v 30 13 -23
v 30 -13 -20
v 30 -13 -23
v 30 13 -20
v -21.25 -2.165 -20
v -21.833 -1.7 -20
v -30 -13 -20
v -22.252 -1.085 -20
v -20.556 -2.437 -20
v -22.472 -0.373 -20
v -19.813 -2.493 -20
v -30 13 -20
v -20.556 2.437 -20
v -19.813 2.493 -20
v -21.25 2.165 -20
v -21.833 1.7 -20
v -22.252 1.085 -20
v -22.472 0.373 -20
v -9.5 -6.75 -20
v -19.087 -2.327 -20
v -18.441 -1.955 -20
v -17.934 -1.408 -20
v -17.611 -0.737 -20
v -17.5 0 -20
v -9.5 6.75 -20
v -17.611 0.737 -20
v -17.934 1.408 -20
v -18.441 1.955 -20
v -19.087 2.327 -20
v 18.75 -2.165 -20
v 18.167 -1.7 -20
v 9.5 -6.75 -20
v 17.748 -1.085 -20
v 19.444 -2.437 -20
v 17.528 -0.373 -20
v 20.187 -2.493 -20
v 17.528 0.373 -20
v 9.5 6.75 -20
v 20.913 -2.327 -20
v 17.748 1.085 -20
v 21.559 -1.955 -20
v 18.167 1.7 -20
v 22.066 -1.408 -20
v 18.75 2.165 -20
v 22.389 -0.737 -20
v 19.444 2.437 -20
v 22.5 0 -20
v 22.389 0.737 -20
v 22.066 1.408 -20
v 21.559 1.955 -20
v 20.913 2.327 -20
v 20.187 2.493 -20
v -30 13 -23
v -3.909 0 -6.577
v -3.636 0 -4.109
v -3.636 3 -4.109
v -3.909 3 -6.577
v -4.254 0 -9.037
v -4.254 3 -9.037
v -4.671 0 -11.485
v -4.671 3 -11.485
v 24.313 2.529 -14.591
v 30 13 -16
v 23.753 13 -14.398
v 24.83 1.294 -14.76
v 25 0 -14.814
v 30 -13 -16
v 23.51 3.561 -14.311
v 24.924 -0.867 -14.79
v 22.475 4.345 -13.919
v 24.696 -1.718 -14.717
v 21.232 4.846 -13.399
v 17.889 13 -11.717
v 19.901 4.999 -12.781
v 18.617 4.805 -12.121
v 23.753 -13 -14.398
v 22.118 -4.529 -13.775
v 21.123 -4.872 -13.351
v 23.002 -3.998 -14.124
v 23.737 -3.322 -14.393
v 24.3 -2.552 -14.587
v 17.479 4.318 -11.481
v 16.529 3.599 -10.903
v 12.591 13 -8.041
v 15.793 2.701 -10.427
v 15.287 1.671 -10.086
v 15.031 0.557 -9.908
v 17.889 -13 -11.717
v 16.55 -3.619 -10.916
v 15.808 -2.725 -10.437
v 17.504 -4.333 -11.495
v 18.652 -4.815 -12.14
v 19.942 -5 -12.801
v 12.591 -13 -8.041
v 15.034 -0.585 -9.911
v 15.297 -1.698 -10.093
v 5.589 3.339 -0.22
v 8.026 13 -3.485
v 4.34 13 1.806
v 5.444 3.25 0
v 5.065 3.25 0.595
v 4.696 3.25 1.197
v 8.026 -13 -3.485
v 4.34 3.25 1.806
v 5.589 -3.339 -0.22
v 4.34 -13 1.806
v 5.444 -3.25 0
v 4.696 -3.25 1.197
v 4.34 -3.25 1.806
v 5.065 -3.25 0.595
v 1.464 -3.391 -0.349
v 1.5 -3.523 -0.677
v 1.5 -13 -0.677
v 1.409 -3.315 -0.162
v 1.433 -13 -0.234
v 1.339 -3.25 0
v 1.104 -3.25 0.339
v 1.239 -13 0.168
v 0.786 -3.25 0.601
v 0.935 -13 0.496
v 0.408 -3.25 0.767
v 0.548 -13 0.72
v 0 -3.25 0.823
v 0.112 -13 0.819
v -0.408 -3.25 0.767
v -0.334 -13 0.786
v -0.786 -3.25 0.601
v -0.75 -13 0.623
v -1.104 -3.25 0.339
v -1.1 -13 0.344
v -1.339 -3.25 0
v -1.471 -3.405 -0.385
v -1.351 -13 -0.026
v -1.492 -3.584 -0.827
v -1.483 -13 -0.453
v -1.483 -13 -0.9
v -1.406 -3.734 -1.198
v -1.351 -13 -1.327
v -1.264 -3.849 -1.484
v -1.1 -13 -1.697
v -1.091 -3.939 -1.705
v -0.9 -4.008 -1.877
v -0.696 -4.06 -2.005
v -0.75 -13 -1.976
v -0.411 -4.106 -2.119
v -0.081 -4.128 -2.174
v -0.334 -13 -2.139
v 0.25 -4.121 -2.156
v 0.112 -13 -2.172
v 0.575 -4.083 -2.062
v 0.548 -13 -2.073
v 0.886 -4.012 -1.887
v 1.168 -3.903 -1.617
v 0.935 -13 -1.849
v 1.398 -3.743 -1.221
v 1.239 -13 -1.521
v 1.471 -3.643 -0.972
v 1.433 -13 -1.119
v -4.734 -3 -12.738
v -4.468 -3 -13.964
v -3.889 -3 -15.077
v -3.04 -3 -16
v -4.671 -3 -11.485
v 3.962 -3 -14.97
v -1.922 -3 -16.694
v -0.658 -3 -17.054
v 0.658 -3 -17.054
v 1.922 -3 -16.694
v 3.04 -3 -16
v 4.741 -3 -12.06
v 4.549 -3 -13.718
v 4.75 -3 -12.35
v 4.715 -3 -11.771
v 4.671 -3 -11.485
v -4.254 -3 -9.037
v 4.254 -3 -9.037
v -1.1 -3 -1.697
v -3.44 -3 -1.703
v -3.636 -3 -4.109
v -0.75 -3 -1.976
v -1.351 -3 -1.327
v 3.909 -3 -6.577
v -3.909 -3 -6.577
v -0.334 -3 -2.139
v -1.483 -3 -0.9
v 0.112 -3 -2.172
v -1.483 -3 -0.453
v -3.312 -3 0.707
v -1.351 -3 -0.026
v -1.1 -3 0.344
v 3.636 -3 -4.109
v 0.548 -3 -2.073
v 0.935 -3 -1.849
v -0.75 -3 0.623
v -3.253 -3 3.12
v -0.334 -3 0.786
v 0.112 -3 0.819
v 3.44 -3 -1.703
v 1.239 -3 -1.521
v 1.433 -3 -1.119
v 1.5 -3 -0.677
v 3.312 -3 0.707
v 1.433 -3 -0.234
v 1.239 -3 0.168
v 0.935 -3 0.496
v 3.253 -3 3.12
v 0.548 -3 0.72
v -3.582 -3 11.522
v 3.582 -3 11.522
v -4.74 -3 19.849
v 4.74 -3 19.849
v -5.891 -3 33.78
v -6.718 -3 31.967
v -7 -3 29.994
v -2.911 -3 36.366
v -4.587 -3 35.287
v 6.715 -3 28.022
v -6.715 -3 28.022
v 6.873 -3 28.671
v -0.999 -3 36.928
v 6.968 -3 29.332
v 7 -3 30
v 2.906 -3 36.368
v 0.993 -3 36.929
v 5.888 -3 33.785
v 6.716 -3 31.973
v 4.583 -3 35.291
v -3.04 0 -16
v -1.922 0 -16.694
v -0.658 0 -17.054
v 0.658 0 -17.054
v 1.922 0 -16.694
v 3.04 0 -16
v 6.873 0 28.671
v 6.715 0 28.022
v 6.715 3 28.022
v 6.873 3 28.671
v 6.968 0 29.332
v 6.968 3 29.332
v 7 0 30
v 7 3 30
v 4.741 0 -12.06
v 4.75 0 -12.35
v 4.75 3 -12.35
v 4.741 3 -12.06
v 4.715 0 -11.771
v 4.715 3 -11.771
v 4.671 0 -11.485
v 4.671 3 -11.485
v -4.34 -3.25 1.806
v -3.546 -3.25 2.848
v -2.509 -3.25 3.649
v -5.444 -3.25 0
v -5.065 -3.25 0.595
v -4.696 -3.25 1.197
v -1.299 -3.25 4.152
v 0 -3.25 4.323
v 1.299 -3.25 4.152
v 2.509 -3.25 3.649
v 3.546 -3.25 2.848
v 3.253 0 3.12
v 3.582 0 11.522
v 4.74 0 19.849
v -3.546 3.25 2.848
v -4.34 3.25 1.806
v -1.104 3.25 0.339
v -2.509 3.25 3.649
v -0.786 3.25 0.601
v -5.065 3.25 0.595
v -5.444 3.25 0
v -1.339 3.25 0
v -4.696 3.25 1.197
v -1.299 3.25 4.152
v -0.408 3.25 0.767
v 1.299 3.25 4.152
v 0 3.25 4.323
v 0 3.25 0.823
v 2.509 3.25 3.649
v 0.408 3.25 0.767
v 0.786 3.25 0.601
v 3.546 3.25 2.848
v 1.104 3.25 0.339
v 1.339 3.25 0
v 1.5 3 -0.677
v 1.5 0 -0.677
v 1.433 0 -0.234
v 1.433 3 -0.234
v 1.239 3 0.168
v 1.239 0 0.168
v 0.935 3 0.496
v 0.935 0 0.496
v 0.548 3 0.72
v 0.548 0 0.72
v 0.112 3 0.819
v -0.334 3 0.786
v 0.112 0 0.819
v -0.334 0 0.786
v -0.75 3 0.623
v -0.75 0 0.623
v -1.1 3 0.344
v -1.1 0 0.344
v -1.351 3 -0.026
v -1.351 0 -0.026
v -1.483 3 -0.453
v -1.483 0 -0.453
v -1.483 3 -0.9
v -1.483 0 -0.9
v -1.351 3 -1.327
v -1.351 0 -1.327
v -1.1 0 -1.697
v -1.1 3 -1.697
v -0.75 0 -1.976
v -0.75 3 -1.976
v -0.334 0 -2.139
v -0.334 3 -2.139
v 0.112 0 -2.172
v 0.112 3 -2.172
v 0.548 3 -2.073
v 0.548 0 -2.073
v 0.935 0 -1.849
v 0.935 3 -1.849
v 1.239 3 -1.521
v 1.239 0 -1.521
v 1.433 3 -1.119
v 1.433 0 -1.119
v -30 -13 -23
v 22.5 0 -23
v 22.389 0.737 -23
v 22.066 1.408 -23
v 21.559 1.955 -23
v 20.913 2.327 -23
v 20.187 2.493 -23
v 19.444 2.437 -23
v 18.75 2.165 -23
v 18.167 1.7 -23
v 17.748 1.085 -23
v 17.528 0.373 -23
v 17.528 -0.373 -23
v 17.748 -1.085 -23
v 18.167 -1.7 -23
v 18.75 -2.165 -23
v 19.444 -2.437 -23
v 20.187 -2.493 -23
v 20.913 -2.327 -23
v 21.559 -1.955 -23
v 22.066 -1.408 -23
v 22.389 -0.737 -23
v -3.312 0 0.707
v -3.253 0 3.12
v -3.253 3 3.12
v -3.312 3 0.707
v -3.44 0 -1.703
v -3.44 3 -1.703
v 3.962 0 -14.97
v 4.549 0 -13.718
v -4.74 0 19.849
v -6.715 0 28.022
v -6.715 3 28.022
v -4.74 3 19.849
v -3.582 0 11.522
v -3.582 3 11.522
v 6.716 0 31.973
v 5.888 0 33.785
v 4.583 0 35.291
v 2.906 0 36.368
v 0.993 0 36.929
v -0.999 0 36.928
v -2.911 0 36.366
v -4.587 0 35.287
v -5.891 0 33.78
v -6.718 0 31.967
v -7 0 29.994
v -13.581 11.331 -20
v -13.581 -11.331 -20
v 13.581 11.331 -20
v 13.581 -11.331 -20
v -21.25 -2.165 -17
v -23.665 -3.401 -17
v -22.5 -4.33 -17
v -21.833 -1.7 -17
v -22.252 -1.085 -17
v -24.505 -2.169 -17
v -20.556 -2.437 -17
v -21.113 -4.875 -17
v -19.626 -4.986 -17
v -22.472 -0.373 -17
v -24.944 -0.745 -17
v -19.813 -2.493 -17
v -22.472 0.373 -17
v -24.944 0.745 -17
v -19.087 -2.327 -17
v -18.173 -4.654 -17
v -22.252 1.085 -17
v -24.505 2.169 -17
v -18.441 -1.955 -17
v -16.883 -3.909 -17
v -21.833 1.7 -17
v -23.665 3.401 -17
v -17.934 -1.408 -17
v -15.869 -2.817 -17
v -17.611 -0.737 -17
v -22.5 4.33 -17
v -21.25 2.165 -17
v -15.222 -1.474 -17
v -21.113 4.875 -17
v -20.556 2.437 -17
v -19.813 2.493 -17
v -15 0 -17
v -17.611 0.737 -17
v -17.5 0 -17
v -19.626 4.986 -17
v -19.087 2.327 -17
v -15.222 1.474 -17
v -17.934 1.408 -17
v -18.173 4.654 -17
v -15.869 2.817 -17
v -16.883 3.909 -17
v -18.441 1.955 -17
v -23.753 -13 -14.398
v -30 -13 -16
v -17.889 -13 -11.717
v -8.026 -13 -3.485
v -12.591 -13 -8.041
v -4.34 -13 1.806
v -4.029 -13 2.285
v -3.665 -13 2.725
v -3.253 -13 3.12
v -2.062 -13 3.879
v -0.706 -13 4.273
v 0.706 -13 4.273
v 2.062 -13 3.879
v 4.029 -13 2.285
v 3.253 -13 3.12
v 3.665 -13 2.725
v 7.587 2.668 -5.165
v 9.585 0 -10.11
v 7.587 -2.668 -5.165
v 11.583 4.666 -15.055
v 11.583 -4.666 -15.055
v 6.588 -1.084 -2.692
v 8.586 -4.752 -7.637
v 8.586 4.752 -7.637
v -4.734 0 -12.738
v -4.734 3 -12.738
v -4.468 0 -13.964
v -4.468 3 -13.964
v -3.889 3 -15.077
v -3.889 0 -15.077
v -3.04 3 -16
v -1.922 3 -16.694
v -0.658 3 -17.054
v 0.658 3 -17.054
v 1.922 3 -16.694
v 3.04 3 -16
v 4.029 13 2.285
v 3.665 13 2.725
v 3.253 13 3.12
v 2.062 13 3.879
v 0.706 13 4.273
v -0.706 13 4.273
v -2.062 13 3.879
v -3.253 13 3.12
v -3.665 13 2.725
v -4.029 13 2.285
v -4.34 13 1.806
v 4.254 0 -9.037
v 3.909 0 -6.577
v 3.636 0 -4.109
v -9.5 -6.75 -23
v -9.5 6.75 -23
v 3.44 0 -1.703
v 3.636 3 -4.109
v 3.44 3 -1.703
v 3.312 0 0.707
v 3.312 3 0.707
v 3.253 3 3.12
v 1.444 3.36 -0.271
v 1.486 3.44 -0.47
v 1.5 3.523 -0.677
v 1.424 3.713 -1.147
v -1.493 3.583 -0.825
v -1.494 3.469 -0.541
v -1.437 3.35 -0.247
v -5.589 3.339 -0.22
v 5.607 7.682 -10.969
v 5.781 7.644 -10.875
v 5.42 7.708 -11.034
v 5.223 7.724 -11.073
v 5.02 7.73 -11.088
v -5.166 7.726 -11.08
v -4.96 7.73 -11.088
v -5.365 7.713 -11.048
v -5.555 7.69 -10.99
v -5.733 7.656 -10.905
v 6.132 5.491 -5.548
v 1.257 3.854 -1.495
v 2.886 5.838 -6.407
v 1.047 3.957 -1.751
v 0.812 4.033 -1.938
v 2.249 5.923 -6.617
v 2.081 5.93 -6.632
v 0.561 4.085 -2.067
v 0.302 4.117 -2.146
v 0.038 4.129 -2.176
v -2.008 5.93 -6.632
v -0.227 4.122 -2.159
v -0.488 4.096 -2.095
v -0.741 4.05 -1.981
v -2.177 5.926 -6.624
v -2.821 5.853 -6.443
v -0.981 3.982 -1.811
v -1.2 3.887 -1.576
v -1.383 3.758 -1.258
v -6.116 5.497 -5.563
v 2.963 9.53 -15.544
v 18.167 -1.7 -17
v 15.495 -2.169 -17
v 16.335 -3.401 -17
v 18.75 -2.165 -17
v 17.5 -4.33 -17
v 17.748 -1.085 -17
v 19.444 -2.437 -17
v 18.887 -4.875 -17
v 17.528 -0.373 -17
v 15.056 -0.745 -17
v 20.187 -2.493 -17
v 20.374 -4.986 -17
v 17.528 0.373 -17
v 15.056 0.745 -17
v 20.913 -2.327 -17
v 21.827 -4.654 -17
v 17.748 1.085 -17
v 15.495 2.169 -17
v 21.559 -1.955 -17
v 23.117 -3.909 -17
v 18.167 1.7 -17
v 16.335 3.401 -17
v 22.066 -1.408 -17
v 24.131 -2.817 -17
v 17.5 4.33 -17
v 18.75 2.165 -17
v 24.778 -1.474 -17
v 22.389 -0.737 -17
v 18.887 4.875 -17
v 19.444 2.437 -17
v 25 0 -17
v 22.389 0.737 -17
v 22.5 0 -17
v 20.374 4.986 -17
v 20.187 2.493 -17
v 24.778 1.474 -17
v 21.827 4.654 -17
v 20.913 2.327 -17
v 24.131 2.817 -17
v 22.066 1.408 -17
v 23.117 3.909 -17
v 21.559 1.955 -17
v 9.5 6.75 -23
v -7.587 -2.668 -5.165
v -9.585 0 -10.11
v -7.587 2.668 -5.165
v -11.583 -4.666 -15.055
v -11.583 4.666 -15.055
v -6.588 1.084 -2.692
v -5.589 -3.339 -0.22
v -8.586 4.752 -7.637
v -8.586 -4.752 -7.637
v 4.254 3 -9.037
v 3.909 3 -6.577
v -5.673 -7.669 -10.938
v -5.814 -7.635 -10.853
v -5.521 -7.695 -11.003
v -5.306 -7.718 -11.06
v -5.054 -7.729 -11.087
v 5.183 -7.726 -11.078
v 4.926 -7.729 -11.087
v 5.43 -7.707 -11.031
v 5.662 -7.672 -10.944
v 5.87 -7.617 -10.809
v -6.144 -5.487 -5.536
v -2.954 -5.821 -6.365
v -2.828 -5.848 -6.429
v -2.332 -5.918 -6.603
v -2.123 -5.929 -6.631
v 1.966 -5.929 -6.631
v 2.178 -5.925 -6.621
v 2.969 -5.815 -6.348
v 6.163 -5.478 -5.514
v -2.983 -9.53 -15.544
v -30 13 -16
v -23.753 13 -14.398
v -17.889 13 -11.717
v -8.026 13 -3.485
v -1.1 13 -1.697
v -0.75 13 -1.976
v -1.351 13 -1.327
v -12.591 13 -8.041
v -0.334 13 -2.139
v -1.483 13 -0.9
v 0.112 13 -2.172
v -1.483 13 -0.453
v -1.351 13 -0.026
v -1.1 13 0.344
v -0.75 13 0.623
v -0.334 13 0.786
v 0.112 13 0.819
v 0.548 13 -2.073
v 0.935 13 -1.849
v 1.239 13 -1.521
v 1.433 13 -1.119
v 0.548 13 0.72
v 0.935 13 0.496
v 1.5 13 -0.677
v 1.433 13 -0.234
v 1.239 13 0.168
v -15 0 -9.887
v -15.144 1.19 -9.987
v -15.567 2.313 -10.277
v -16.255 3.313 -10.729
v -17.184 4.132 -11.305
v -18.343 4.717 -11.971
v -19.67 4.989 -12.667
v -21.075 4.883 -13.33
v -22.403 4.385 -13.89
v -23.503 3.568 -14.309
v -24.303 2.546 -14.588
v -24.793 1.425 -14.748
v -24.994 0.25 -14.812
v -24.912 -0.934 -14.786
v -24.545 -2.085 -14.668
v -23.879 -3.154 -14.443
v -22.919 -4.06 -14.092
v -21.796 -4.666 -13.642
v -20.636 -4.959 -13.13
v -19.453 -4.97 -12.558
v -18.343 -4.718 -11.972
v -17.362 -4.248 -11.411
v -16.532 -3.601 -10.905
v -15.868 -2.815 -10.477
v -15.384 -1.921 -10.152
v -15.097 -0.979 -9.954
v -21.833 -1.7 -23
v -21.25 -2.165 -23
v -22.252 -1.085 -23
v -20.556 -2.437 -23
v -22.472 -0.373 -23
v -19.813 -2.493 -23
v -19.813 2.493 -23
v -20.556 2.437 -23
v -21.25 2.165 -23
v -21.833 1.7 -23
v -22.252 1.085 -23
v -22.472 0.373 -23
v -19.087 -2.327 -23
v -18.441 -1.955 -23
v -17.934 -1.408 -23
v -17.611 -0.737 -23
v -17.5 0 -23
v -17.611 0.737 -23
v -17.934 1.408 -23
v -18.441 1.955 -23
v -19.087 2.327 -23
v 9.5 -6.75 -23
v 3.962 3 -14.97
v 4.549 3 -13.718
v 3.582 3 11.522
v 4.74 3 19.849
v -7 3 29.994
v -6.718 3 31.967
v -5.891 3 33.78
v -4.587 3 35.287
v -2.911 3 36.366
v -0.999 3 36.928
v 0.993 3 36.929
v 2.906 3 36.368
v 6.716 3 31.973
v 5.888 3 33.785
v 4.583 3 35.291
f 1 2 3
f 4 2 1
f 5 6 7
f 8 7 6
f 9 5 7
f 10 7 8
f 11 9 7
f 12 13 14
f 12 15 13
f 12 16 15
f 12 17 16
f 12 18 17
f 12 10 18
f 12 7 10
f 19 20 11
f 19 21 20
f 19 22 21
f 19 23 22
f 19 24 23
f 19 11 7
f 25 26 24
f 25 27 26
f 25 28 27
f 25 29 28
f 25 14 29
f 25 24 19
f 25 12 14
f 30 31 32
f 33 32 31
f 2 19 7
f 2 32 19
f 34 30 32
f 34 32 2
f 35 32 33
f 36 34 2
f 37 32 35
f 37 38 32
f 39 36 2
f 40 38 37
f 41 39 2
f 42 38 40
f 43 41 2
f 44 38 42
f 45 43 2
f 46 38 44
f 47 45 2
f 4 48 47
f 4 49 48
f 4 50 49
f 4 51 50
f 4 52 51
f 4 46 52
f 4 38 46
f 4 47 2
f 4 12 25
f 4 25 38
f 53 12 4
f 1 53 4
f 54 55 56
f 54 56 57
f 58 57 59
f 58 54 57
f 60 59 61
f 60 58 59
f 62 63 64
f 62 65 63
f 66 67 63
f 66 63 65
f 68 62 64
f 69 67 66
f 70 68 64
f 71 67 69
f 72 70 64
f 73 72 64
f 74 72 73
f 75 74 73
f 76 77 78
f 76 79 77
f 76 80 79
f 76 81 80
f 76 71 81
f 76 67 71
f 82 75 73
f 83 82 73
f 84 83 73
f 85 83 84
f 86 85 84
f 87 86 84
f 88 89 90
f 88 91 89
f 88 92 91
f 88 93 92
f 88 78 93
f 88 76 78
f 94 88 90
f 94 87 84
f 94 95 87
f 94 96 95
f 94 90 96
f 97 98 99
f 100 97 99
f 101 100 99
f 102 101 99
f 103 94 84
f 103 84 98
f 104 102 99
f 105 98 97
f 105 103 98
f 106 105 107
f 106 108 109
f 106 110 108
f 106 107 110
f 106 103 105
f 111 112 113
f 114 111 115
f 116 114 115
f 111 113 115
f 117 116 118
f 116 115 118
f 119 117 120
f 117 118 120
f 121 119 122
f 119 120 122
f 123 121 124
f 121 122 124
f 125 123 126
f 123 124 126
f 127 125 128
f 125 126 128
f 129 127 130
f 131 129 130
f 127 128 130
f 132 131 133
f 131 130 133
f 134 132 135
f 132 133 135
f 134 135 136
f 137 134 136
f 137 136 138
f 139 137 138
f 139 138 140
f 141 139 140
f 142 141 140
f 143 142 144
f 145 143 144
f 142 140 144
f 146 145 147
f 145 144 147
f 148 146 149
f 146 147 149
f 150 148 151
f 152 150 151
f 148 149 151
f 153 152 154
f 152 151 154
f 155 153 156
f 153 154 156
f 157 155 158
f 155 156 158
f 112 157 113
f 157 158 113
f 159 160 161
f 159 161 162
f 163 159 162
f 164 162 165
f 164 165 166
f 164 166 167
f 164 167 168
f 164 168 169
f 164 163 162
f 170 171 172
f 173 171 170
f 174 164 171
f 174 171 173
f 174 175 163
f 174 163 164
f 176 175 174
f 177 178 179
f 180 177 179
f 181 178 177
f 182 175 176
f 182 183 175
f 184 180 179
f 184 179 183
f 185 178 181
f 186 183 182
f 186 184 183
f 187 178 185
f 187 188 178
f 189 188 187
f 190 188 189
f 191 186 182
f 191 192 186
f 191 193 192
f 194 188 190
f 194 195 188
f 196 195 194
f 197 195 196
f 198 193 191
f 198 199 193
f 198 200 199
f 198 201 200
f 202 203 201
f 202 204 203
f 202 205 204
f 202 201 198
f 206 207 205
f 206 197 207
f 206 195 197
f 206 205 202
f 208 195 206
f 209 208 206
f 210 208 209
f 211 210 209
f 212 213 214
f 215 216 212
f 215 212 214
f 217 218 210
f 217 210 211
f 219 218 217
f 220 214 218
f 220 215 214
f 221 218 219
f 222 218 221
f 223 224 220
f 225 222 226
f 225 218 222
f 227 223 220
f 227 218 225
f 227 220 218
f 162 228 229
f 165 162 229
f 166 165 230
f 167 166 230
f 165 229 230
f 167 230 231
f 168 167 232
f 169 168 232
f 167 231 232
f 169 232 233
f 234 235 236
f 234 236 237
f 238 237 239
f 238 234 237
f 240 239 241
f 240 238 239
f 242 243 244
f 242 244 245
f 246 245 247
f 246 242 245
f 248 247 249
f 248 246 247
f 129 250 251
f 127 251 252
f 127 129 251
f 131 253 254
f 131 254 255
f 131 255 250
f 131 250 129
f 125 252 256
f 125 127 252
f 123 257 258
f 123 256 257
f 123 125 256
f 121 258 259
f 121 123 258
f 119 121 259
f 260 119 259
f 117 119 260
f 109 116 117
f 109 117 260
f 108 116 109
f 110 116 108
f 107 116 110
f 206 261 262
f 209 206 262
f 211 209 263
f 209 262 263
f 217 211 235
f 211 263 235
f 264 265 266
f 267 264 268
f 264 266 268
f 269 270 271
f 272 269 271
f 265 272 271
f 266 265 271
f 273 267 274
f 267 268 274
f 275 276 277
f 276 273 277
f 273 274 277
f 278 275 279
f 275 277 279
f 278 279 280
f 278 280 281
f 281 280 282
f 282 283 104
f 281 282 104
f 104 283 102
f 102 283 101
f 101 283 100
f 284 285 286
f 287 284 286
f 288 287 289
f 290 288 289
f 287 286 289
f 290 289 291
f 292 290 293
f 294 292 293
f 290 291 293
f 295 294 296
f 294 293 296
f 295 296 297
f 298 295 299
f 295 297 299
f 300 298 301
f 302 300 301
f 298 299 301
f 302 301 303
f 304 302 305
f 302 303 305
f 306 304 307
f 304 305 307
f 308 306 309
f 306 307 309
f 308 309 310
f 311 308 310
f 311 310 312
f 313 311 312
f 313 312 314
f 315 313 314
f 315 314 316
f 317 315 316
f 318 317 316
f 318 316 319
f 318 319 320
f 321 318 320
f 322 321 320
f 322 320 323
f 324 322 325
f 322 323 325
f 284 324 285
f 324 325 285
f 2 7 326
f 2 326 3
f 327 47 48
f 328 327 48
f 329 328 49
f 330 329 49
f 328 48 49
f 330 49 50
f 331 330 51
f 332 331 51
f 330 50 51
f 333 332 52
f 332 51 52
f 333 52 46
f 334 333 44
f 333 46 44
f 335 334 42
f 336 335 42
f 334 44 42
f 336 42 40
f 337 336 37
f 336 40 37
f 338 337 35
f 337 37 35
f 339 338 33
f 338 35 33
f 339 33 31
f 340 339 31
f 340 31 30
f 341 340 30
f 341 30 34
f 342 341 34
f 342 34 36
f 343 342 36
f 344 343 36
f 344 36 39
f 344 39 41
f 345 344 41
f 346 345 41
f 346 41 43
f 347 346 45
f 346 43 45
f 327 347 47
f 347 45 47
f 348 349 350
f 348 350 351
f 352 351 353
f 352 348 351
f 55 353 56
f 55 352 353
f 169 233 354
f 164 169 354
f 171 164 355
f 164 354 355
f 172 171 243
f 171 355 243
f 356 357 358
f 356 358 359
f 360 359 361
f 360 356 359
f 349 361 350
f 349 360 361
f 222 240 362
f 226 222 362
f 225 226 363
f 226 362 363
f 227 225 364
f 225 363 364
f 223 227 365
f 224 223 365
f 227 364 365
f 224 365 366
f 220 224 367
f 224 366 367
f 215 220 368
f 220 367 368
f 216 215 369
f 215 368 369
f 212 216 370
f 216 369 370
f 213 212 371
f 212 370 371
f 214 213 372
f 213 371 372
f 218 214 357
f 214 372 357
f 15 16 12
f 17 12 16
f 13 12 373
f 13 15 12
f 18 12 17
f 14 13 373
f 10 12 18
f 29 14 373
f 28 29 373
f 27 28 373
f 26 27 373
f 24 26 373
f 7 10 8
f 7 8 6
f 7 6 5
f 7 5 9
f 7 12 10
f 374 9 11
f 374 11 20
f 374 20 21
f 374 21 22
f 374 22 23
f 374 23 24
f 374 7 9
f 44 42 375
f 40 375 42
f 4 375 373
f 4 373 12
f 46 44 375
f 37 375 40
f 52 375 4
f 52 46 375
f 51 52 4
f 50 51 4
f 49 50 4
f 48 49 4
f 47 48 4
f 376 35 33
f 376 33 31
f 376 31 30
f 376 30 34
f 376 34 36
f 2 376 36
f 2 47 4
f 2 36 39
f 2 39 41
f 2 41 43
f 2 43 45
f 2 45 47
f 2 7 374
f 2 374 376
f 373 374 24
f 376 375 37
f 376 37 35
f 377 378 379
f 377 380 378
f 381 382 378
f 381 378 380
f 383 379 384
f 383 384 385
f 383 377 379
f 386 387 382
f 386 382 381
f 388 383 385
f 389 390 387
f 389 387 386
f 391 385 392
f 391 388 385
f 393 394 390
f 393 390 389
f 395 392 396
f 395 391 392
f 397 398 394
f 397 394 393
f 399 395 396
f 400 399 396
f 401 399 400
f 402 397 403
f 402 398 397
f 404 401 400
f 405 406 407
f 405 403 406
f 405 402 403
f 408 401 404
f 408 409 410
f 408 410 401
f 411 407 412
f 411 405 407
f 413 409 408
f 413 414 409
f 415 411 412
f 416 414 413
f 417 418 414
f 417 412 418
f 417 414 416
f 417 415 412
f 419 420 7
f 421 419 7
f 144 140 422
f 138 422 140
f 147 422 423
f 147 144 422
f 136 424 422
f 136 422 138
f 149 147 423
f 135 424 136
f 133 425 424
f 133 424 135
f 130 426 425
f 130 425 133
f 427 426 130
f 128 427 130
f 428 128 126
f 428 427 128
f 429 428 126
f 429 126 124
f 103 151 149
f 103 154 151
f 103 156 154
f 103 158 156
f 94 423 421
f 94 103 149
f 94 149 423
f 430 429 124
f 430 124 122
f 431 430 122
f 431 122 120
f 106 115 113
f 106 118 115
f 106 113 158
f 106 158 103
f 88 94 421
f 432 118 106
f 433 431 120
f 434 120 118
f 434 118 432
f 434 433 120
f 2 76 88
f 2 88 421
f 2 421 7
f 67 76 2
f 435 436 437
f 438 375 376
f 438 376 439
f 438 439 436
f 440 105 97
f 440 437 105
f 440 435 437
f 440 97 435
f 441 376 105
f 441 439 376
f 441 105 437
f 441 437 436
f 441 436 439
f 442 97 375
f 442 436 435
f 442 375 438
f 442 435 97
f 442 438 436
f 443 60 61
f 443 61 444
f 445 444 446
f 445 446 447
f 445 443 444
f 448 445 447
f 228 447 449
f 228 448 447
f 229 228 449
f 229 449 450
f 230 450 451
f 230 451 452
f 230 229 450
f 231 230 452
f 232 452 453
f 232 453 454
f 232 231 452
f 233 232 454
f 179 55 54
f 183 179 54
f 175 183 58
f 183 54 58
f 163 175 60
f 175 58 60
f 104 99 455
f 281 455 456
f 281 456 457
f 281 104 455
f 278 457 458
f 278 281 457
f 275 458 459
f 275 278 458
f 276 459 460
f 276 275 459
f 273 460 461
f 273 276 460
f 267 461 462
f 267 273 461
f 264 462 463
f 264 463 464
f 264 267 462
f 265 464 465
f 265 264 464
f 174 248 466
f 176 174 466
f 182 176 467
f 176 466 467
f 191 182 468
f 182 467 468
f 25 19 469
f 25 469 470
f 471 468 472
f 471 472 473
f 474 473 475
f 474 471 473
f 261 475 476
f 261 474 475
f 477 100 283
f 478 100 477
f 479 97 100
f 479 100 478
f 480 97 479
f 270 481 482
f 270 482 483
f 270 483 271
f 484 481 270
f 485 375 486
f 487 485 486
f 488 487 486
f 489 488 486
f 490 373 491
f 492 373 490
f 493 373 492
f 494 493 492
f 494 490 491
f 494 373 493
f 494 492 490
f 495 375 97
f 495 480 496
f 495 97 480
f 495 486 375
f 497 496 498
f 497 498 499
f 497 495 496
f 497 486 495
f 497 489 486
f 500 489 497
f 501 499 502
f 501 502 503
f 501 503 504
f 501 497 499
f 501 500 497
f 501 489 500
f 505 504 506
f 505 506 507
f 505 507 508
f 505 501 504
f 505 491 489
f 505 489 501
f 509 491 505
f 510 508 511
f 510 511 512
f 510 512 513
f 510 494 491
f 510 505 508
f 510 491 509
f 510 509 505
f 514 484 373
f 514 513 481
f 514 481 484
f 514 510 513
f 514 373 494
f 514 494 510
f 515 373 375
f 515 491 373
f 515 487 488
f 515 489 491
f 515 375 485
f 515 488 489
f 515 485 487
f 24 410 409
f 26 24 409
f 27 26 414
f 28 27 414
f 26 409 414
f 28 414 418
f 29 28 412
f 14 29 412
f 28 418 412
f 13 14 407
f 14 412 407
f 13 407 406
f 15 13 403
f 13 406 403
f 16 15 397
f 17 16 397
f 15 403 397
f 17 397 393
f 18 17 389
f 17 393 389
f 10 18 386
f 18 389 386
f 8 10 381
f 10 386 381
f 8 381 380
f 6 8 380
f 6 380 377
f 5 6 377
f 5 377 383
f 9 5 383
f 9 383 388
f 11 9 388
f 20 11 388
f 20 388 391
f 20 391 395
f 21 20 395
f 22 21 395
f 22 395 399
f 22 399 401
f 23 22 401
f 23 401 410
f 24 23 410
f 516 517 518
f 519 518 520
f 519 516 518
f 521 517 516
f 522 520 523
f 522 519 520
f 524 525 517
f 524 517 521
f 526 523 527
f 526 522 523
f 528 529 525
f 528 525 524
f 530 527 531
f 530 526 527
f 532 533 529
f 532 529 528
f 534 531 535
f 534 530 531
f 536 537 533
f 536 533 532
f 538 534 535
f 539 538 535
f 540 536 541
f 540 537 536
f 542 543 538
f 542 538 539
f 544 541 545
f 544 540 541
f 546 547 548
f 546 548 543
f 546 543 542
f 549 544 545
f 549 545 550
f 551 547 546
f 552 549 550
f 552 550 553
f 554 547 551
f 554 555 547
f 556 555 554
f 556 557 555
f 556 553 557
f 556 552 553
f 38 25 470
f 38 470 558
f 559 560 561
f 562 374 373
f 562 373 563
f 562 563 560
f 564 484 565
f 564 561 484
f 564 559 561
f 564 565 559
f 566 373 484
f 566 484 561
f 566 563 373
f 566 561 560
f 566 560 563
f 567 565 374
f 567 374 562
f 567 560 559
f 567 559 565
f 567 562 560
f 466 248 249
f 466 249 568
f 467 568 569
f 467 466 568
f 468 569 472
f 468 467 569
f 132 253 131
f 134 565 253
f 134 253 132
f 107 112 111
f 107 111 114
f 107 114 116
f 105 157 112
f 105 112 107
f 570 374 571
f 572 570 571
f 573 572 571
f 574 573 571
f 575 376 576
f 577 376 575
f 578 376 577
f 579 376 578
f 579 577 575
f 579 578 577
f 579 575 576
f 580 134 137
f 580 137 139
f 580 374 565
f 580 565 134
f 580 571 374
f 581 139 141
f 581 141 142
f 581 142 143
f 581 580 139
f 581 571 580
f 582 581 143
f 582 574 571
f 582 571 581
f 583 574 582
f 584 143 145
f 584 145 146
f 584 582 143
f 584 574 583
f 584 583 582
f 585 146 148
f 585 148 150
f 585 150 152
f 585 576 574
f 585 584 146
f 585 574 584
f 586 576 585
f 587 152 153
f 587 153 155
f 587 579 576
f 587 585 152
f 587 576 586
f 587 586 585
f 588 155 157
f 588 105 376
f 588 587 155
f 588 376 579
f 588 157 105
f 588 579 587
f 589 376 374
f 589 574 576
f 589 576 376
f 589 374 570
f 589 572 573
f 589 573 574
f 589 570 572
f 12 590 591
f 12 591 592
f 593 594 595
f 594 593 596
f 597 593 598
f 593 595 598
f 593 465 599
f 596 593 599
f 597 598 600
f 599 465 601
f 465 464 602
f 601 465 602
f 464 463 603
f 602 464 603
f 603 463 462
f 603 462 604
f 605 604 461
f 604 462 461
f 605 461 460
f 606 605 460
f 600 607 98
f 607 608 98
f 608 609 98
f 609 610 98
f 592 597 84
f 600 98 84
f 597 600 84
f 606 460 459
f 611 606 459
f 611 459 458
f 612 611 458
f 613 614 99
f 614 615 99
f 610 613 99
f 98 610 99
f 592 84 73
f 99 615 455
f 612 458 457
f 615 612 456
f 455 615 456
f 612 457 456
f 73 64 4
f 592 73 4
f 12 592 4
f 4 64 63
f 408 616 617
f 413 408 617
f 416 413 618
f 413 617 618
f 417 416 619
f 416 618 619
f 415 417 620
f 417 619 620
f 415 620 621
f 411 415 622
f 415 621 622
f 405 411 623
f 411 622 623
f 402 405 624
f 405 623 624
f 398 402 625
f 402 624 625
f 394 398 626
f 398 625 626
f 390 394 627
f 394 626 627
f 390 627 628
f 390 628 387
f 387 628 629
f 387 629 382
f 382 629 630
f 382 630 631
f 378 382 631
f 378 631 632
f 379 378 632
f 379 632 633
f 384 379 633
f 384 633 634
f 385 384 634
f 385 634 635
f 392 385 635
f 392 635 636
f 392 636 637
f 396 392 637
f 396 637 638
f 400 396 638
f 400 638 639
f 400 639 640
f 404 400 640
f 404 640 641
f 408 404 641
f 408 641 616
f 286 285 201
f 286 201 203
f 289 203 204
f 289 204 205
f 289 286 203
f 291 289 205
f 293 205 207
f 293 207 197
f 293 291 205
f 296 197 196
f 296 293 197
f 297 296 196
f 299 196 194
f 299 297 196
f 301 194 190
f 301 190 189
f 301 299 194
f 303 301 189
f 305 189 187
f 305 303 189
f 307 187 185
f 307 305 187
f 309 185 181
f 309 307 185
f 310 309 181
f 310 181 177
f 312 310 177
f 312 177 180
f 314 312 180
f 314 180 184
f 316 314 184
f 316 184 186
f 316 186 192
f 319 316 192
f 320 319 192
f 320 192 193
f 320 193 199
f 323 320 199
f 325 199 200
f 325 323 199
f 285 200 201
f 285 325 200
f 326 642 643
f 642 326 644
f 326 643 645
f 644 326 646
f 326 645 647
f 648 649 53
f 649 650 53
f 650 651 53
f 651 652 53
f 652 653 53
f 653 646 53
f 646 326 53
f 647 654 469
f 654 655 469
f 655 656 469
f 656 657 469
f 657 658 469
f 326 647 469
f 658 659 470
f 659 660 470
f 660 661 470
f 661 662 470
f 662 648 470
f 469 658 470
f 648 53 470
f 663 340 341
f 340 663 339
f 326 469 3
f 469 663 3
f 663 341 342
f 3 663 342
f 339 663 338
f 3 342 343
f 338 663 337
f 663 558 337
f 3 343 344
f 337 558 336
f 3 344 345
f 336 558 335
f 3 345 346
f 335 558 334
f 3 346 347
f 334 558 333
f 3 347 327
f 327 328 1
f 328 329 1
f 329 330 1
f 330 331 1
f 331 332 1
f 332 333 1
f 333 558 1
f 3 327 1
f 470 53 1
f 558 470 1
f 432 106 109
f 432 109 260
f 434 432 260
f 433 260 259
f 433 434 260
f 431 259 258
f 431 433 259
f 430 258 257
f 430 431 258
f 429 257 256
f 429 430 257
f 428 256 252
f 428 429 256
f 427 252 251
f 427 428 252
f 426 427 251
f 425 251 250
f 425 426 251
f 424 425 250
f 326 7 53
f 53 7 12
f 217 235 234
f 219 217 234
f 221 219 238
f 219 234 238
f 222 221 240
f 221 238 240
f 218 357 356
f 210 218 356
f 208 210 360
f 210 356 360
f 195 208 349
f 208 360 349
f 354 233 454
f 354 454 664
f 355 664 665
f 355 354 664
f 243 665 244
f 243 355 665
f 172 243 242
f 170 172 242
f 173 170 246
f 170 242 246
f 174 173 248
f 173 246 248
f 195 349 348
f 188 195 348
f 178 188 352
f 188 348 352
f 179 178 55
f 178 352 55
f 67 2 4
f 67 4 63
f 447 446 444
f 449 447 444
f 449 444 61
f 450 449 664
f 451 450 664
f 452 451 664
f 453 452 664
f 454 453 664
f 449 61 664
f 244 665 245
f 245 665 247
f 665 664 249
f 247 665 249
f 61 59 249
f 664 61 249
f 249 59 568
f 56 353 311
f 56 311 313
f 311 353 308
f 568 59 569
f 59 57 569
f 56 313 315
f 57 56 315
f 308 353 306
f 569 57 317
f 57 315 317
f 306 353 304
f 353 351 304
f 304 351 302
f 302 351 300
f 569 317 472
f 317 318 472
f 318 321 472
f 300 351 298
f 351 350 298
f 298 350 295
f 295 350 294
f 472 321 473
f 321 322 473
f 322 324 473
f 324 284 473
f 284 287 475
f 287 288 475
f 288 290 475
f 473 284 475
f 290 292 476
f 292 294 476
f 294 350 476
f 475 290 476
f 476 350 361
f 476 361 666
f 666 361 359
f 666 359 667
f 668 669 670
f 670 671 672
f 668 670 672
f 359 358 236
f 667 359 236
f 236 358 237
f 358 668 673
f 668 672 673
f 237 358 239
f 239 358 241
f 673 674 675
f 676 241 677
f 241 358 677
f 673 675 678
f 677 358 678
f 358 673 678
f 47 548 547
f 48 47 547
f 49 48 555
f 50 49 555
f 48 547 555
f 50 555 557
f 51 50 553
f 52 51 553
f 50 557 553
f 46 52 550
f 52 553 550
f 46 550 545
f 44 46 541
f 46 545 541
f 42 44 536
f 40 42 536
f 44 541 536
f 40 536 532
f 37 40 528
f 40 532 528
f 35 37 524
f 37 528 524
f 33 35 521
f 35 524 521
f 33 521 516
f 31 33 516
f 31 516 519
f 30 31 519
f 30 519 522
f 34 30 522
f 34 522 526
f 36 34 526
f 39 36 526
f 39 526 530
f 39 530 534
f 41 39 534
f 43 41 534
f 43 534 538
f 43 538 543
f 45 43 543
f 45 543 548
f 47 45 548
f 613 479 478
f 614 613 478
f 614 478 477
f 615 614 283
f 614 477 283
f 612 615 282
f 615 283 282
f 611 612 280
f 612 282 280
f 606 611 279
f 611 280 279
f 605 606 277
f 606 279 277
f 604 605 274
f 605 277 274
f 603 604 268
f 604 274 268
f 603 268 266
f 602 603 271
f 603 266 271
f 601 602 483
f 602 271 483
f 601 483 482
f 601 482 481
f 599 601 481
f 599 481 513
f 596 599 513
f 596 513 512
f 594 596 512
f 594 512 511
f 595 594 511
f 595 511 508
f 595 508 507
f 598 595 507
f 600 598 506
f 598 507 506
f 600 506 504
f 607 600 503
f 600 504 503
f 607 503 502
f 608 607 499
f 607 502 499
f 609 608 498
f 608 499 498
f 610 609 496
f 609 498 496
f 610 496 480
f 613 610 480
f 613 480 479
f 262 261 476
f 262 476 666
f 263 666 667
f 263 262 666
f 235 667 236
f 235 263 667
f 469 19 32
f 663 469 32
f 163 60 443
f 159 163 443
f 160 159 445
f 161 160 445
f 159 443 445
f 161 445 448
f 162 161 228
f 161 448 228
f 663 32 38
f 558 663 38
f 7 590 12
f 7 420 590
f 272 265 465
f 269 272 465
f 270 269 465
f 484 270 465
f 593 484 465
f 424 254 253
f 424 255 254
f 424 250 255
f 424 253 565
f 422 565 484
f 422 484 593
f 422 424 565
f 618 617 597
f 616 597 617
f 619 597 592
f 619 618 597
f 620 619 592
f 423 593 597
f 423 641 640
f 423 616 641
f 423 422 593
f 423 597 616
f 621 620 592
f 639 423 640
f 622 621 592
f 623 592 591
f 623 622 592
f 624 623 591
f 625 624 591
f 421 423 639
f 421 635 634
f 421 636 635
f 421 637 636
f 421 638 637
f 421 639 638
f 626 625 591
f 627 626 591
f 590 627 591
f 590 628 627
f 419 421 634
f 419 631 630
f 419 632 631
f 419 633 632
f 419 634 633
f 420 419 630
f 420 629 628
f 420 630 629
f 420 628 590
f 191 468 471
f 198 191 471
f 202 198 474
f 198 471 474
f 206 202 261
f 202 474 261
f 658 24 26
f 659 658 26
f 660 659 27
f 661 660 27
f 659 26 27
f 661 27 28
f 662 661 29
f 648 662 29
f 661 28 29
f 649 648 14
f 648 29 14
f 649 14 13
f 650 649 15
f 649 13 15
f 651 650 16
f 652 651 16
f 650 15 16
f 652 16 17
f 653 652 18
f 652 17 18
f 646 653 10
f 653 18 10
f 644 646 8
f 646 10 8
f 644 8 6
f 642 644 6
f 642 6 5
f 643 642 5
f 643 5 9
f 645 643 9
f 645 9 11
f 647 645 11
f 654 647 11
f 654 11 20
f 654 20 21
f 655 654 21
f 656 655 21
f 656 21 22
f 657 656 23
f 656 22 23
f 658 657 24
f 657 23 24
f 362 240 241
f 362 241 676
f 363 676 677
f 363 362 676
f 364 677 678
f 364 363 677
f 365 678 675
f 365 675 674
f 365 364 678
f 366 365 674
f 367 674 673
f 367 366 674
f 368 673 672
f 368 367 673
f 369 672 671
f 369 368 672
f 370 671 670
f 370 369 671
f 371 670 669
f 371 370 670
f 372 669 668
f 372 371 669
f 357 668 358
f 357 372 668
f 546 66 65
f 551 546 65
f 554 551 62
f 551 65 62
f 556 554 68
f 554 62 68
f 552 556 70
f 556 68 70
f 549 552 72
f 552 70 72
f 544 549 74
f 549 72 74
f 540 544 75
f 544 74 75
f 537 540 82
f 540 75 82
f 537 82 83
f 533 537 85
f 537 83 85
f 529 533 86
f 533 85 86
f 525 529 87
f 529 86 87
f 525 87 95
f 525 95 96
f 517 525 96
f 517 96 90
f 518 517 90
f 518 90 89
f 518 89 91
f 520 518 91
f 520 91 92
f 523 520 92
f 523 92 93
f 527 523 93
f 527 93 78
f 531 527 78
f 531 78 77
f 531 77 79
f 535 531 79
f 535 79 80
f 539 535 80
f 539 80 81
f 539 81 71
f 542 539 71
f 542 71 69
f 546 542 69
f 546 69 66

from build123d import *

# Parameters (mm, degrees)
F0_R          = 1.5
F1_DEPTH      = 3
F1_DEPTH_BACK = 3
F2_DEPTH      = 13
F2_DEPTH_BACK = 13
F3_W          = 11
F3_H          = 6.5
F4_DEPTH      = 25
F4_TAPER      = -22
F4_DEPTH_BACK = 25
F5_START      = -20
F3_W_2        = 60
F3_H_2        = 26
F3_R          = 5
F3_W_3        = 19
F3_H_3        = 13.5
F3_R_2        = 2.5
F5_DEPTH      = 3
F6_DEPTH      = 25
F7_DEPTH      = 17


# Not quite as in the source:
# - a feature names something its author has since deleted; it is built from what else it names


with BuildPart() as f1:
    # F0 (on Front) → F1 (new body, two sides)
    with BuildSketch(Plane.XZ) as f1_sk:
        with BuildLine():
            ThreePointArc((3.0397368307, -16), (4.3012352845, -14.3654093944), (4.75, -12.35))
            ThreePointArc((4.75, -12.35), (4.7300948444, -11.9156006874), (4.6705462051, -11.4848421267))
            ThreePointArc((4.6705462051, -11.4848421267), (0, -7.6), (-4.6705462051, -11.4848421267))
            ThreePointArc((-4.6705462051, -11.4848421267), (-4.4675249052, -13.9636050389), (-3.0397368307, -16))
            Line((-3.0397368307, -16), (3.0397368307, -16))
        make_face()
        with BuildLine():
            ThreePointArc((-4.6705462051, -11.4848421267), (0, -7.6), (4.6705462051, -11.4848421267))
            ThreePointArc((4.6705462051, -11.4848421267), (4.0724799807, -7.8080264222), (3.6360864347, -4.1085375916))
            ThreePointArc((3.6360864347, -4.1085375916), (0, -5.6765009603), (-3.6360864347, -4.1085375916))
            ThreePointArc((-3.6360864347, -4.1085375916), (-4.0724799807, -7.8080264222), (-4.6705462051, -11.4848421267))
        make_face()
        with BuildLine():
            ThreePointArc((-3.0397368307, -16), (0, -17.1), (3.0397368307, -16))
            Line((3.0397368307, -16), (-3.0397368307, -16))
        make_face()
        with BuildLine():
            ThreePointArc((-3.6360864347, -4.1085375916), (0, -5.6765009603), (3.6360864347, -4.1085375916))
            ThreePointArc((3.6360864347, -4.1085375916), (3.3676823781, -0.498156975), (3.2532612438, 3.1203781897))
            ThreePointArc((3.2532612438, 3.1203781897), (0, 4.3234990397), (-3.2532612438, 3.1203781897))
            ThreePointArc((-3.2532612438, 3.1203781897), (-3.3676823781, -0.498156975), (-3.6360864347, -4.1085375916))
        make_face()
        with Locations((0, -0.6765009603)):
            Circle(F0_R, mode=Mode.SUBTRACT)
        with BuildLine():
            ThreePointArc((-3.2532612438, 3.1203781897), (0, 4.3234990397), (3.2532612438, 3.1203781897))
            ThreePointArc((3.2532612438, 3.1203781897), (4.0582011416, 15.6996189973), (6.7145781542, 28.0215055695))
            ThreePointArc((6.7145781542, 28.0215055695), (0, 23), (-6.7145781542, 28.0215055695))
            ThreePointArc((-6.7145781542, 28.0215055695), (-4.0582011416, 15.6996189973), (-3.2532612438, 3.1203781897))
        make_face()
        with BuildLine():
            ThreePointArc((-6.7145781542, 28.0215055695), (0, 23), (6.7145781542, 28.0215055695))
            ThreePointArc((6.7145781542, 28.0215055695), (6.9282770975, 29.0005119008), (7, 30))
            ThreePointArc((7, 30), (-0.9994880992, 36.9282770975), (-6.7145781542, 28.0215055695))
        make_face()
    extrude(amount=F1_DEPTH)
    extrude(f1_sk.sketch, amount=-F1_DEPTH_BACK)


with BuildPart() as f2:
    # F0 (on Front) → F2 (new body, two sides)
    with BuildSketch(Plane.XZ) as f2_sk:
        with BuildLine():
            ThreePointArc((3.0397368307, -16), (4.3012352845, -14.3654093944), (4.75, -12.35))
            ThreePointArc((4.75, -12.35), (4.7300948444, -11.9156006874), (4.6705462051, -11.4848421267))
            ThreePointArc((4.6705462051, -11.4848421267), (0, -7.6), (-4.6705462051, -11.4848421267))
            ThreePointArc((-4.6705462051, -11.4848421267), (-4.4675249052, -13.9636050389), (-3.0397368307, -16))
            Line((-3.0397368307, -16), (3.0397368307, -16))
        make_face()
        with BuildLine():
            ThreePointArc((4.6705462051, -11.4848421267), (4.7300948444, -11.9156006874), (4.75, -12.35))
            ThreePointArc((4.75, -12.35), (4.3012352845, -14.3654093944), (3.0397368307, -16))
            Line((3.0397368307, -16), (30, -16))
            ThreePointArc((30, -16), (15.1577815574, -9.9967996829), (4.3401298873, 1.8060929577))
            ThreePointArc((4.3401298873, 1.8060929577), (4.8322173708, 0.607895895), (5, -0.6765009603))
            ThreePointArc((5, -0.6765009603), (4.6465273148, -2.5230609818), (3.6360864347, -4.1085375916))
            ThreePointArc((3.6360864347, -4.1085375916), (4.0724799807, -7.8080264222), (4.6705462051, -11.4848421267))
        make_face()
        with BuildLine():
            ThreePointArc((-4.6705462051, -11.4848421267), (0, -7.6), (4.6705462051, -11.4848421267))
            ThreePointArc((4.6705462051, -11.4848421267), (4.0724799807, -7.8080264222), (3.6360864347, -4.1085375916))
            ThreePointArc((3.6360864347, -4.1085375916), (0, -5.6765009603), (-3.6360864347, -4.1085375916))
            ThreePointArc((-3.6360864347, -4.1085375916), (-4.0724799807, -7.8080264222), (-4.6705462051, -11.4848421267))
        make_face()
        with BuildLine():
            Line((30, -16), (3.0397368307, -16))
            ThreePointArc((3.0397368307, -16), (0, -17.1), (-3.0397368307, -16))
            Line((-3.0397368307, -16), (-30, -16))
            Line((-30, -16), (-30, -20))
            Line((-30, -20), (30, -20))
            Line((30, -20), (30, -16))
        make_face()
        with BuildLine():
            ThreePointArc((-3.0397368307, -16), (0, -17.1), (3.0397368307, -16))
            Line((3.0397368307, -16), (-3.0397368307, -16))
        make_face()
        with BuildLine():
            ThreePointArc((-3.0397368307, -16), (-4.4675249052, -13.9636050389), (-4.6705462051, -11.4848421267))
            ThreePointArc((-4.6705462051, -11.4848421267), (-4.0724799807, -7.8080264222), (-3.6360864347, -4.1085375916))
            ThreePointArc((-3.6360864347, -4.1085375916), (-4.9649491778, -1.2674998285), (-4.3401298873, 1.8060929577))
            ThreePointArc((-4.3401298873, 1.8060929577), (-15.1577815574, -9.9967996829), (-30, -16))
            Line((-30, -16), (-3.0397368307, -16))
        make_face()
        with BuildLine():
            ThreePointArc((-3.6360864347, -4.1085375916), (0, -5.6765009603), (3.6360864347, -4.1085375916))
            ThreePointArc((3.6360864347, -4.1085375916), (3.3676823781, -0.498156975), (3.2532612438, 3.1203781897))
            ThreePointArc((3.2532612438, 3.1203781897), (0, 4.3234990397), (-3.2532612438, 3.1203781897))
            ThreePointArc((-3.2532612438, 3.1203781897), (-3.3676823781, -0.498156975), (-3.6360864347, -4.1085375916))
        make_face()
        with Locations((0, -0.6765009603)):
            Circle(F0_R, mode=Mode.SUBTRACT)
        with BuildLine():
            ThreePointArc((3.2532612438, 3.1203781897), (3.3676823781, -0.498156975), (3.6360864347, -4.1085375916))
            ThreePointArc((3.6360864347, -4.1085375916), (4.6465273148, -2.5230609818), (5, -0.6765009603))
            ThreePointArc((5, -0.6765009603), (4.8322173708, 0.607895895), (4.3401298873, 1.8060929577))
            ThreePointArc((4.3401298873, 1.8060929577), (3.85314594, 2.5099180902), (3.2532612438, 3.1203781897))
        make_face()
        with BuildLine():
            ThreePointArc((-4.3401298873, 1.8060929577), (-4.9649491778, -1.2674998285), (-3.6360864347, -4.1085375916))
            ThreePointArc((-3.6360864347, -4.1085375916), (-3.3676823781, -0.498156975), (-3.2532612438, 3.1203781897))
            ThreePointArc((-3.2532612438, 3.1203781897), (-3.85314594, 2.5099180902), (-4.3401298873, 1.8060929577))
        make_face()
    extrude(amount=F2_DEPTH)
    extrude(f2_sk.sketch, amount=-F2_DEPTH_BACK)

    # F3 (on Top) → F4 (cut, two sides)
    with BuildSketch(Plane.XY) as f4_sk:
        Rectangle(F3_W, F3_H)
    extrude(amount=-F4_DEPTH, taper=F4_TAPER, mode=Mode.SUBTRACT)
    extrude(f4_sk.sketch, amount=F4_DEPTH_BACK, mode=Mode.SUBTRACT)

    # F3 (on Top) → F6 (cut)
    with BuildSketch(Plane.XY):
        with Locations((-20, 0)):
            Circle(F3_R_2)
        with Locations((20, 0)):
            Circle(F3_R_2)
    extrude(amount=-F6_DEPTH, mode=Mode.SUBTRACT)

    # F3 (on Top) → F7 (cut)
    with BuildSketch(Plane.XY):
        with Locations((-20, 0)):
            Circle(F3_R)
        with Locations((-20, 0)):
            Circle(F3_R_2, mode=Mode.SUBTRACT)
        with Locations((20, 0)):
            Circle(F3_R)
        with Locations((20, 0)):
            Circle(F3_R_2, mode=Mode.SUBTRACT)
    extrude(amount=-F7_DEPTH, mode=Mode.SUBTRACT)


with BuildPart() as f5:
    # F3 (on Top) → F5 (new body)
    with BuildSketch(Plane.XY.offset(F5_START)):
        Rectangle(F3_W_2, F3_H_2)
        with Locations((-20, 0)):
            Circle(F3_R, mode=Mode.SUBTRACT)
        Rectangle(F3_W_3, F3_H_3, mode=Mode.SUBTRACT)
        with Locations((20, 0)):
            Circle(F3_R, mode=Mode.SUBTRACT)
        with Locations((20, 0)):
            Circle(F3_R)
        with Locations((20, 0)):
            Circle(F3_R_2, mode=Mode.SUBTRACT)
        with Locations((-20, 0)):
            Circle(F3_R)
        with Locations((-20, 0)):
            Circle(F3_R_2, mode=Mode.SUBTRACT)
    extrude(amount=-F5_DEPTH)


solid = Compound([f1.part, f2.part, f5.part])
